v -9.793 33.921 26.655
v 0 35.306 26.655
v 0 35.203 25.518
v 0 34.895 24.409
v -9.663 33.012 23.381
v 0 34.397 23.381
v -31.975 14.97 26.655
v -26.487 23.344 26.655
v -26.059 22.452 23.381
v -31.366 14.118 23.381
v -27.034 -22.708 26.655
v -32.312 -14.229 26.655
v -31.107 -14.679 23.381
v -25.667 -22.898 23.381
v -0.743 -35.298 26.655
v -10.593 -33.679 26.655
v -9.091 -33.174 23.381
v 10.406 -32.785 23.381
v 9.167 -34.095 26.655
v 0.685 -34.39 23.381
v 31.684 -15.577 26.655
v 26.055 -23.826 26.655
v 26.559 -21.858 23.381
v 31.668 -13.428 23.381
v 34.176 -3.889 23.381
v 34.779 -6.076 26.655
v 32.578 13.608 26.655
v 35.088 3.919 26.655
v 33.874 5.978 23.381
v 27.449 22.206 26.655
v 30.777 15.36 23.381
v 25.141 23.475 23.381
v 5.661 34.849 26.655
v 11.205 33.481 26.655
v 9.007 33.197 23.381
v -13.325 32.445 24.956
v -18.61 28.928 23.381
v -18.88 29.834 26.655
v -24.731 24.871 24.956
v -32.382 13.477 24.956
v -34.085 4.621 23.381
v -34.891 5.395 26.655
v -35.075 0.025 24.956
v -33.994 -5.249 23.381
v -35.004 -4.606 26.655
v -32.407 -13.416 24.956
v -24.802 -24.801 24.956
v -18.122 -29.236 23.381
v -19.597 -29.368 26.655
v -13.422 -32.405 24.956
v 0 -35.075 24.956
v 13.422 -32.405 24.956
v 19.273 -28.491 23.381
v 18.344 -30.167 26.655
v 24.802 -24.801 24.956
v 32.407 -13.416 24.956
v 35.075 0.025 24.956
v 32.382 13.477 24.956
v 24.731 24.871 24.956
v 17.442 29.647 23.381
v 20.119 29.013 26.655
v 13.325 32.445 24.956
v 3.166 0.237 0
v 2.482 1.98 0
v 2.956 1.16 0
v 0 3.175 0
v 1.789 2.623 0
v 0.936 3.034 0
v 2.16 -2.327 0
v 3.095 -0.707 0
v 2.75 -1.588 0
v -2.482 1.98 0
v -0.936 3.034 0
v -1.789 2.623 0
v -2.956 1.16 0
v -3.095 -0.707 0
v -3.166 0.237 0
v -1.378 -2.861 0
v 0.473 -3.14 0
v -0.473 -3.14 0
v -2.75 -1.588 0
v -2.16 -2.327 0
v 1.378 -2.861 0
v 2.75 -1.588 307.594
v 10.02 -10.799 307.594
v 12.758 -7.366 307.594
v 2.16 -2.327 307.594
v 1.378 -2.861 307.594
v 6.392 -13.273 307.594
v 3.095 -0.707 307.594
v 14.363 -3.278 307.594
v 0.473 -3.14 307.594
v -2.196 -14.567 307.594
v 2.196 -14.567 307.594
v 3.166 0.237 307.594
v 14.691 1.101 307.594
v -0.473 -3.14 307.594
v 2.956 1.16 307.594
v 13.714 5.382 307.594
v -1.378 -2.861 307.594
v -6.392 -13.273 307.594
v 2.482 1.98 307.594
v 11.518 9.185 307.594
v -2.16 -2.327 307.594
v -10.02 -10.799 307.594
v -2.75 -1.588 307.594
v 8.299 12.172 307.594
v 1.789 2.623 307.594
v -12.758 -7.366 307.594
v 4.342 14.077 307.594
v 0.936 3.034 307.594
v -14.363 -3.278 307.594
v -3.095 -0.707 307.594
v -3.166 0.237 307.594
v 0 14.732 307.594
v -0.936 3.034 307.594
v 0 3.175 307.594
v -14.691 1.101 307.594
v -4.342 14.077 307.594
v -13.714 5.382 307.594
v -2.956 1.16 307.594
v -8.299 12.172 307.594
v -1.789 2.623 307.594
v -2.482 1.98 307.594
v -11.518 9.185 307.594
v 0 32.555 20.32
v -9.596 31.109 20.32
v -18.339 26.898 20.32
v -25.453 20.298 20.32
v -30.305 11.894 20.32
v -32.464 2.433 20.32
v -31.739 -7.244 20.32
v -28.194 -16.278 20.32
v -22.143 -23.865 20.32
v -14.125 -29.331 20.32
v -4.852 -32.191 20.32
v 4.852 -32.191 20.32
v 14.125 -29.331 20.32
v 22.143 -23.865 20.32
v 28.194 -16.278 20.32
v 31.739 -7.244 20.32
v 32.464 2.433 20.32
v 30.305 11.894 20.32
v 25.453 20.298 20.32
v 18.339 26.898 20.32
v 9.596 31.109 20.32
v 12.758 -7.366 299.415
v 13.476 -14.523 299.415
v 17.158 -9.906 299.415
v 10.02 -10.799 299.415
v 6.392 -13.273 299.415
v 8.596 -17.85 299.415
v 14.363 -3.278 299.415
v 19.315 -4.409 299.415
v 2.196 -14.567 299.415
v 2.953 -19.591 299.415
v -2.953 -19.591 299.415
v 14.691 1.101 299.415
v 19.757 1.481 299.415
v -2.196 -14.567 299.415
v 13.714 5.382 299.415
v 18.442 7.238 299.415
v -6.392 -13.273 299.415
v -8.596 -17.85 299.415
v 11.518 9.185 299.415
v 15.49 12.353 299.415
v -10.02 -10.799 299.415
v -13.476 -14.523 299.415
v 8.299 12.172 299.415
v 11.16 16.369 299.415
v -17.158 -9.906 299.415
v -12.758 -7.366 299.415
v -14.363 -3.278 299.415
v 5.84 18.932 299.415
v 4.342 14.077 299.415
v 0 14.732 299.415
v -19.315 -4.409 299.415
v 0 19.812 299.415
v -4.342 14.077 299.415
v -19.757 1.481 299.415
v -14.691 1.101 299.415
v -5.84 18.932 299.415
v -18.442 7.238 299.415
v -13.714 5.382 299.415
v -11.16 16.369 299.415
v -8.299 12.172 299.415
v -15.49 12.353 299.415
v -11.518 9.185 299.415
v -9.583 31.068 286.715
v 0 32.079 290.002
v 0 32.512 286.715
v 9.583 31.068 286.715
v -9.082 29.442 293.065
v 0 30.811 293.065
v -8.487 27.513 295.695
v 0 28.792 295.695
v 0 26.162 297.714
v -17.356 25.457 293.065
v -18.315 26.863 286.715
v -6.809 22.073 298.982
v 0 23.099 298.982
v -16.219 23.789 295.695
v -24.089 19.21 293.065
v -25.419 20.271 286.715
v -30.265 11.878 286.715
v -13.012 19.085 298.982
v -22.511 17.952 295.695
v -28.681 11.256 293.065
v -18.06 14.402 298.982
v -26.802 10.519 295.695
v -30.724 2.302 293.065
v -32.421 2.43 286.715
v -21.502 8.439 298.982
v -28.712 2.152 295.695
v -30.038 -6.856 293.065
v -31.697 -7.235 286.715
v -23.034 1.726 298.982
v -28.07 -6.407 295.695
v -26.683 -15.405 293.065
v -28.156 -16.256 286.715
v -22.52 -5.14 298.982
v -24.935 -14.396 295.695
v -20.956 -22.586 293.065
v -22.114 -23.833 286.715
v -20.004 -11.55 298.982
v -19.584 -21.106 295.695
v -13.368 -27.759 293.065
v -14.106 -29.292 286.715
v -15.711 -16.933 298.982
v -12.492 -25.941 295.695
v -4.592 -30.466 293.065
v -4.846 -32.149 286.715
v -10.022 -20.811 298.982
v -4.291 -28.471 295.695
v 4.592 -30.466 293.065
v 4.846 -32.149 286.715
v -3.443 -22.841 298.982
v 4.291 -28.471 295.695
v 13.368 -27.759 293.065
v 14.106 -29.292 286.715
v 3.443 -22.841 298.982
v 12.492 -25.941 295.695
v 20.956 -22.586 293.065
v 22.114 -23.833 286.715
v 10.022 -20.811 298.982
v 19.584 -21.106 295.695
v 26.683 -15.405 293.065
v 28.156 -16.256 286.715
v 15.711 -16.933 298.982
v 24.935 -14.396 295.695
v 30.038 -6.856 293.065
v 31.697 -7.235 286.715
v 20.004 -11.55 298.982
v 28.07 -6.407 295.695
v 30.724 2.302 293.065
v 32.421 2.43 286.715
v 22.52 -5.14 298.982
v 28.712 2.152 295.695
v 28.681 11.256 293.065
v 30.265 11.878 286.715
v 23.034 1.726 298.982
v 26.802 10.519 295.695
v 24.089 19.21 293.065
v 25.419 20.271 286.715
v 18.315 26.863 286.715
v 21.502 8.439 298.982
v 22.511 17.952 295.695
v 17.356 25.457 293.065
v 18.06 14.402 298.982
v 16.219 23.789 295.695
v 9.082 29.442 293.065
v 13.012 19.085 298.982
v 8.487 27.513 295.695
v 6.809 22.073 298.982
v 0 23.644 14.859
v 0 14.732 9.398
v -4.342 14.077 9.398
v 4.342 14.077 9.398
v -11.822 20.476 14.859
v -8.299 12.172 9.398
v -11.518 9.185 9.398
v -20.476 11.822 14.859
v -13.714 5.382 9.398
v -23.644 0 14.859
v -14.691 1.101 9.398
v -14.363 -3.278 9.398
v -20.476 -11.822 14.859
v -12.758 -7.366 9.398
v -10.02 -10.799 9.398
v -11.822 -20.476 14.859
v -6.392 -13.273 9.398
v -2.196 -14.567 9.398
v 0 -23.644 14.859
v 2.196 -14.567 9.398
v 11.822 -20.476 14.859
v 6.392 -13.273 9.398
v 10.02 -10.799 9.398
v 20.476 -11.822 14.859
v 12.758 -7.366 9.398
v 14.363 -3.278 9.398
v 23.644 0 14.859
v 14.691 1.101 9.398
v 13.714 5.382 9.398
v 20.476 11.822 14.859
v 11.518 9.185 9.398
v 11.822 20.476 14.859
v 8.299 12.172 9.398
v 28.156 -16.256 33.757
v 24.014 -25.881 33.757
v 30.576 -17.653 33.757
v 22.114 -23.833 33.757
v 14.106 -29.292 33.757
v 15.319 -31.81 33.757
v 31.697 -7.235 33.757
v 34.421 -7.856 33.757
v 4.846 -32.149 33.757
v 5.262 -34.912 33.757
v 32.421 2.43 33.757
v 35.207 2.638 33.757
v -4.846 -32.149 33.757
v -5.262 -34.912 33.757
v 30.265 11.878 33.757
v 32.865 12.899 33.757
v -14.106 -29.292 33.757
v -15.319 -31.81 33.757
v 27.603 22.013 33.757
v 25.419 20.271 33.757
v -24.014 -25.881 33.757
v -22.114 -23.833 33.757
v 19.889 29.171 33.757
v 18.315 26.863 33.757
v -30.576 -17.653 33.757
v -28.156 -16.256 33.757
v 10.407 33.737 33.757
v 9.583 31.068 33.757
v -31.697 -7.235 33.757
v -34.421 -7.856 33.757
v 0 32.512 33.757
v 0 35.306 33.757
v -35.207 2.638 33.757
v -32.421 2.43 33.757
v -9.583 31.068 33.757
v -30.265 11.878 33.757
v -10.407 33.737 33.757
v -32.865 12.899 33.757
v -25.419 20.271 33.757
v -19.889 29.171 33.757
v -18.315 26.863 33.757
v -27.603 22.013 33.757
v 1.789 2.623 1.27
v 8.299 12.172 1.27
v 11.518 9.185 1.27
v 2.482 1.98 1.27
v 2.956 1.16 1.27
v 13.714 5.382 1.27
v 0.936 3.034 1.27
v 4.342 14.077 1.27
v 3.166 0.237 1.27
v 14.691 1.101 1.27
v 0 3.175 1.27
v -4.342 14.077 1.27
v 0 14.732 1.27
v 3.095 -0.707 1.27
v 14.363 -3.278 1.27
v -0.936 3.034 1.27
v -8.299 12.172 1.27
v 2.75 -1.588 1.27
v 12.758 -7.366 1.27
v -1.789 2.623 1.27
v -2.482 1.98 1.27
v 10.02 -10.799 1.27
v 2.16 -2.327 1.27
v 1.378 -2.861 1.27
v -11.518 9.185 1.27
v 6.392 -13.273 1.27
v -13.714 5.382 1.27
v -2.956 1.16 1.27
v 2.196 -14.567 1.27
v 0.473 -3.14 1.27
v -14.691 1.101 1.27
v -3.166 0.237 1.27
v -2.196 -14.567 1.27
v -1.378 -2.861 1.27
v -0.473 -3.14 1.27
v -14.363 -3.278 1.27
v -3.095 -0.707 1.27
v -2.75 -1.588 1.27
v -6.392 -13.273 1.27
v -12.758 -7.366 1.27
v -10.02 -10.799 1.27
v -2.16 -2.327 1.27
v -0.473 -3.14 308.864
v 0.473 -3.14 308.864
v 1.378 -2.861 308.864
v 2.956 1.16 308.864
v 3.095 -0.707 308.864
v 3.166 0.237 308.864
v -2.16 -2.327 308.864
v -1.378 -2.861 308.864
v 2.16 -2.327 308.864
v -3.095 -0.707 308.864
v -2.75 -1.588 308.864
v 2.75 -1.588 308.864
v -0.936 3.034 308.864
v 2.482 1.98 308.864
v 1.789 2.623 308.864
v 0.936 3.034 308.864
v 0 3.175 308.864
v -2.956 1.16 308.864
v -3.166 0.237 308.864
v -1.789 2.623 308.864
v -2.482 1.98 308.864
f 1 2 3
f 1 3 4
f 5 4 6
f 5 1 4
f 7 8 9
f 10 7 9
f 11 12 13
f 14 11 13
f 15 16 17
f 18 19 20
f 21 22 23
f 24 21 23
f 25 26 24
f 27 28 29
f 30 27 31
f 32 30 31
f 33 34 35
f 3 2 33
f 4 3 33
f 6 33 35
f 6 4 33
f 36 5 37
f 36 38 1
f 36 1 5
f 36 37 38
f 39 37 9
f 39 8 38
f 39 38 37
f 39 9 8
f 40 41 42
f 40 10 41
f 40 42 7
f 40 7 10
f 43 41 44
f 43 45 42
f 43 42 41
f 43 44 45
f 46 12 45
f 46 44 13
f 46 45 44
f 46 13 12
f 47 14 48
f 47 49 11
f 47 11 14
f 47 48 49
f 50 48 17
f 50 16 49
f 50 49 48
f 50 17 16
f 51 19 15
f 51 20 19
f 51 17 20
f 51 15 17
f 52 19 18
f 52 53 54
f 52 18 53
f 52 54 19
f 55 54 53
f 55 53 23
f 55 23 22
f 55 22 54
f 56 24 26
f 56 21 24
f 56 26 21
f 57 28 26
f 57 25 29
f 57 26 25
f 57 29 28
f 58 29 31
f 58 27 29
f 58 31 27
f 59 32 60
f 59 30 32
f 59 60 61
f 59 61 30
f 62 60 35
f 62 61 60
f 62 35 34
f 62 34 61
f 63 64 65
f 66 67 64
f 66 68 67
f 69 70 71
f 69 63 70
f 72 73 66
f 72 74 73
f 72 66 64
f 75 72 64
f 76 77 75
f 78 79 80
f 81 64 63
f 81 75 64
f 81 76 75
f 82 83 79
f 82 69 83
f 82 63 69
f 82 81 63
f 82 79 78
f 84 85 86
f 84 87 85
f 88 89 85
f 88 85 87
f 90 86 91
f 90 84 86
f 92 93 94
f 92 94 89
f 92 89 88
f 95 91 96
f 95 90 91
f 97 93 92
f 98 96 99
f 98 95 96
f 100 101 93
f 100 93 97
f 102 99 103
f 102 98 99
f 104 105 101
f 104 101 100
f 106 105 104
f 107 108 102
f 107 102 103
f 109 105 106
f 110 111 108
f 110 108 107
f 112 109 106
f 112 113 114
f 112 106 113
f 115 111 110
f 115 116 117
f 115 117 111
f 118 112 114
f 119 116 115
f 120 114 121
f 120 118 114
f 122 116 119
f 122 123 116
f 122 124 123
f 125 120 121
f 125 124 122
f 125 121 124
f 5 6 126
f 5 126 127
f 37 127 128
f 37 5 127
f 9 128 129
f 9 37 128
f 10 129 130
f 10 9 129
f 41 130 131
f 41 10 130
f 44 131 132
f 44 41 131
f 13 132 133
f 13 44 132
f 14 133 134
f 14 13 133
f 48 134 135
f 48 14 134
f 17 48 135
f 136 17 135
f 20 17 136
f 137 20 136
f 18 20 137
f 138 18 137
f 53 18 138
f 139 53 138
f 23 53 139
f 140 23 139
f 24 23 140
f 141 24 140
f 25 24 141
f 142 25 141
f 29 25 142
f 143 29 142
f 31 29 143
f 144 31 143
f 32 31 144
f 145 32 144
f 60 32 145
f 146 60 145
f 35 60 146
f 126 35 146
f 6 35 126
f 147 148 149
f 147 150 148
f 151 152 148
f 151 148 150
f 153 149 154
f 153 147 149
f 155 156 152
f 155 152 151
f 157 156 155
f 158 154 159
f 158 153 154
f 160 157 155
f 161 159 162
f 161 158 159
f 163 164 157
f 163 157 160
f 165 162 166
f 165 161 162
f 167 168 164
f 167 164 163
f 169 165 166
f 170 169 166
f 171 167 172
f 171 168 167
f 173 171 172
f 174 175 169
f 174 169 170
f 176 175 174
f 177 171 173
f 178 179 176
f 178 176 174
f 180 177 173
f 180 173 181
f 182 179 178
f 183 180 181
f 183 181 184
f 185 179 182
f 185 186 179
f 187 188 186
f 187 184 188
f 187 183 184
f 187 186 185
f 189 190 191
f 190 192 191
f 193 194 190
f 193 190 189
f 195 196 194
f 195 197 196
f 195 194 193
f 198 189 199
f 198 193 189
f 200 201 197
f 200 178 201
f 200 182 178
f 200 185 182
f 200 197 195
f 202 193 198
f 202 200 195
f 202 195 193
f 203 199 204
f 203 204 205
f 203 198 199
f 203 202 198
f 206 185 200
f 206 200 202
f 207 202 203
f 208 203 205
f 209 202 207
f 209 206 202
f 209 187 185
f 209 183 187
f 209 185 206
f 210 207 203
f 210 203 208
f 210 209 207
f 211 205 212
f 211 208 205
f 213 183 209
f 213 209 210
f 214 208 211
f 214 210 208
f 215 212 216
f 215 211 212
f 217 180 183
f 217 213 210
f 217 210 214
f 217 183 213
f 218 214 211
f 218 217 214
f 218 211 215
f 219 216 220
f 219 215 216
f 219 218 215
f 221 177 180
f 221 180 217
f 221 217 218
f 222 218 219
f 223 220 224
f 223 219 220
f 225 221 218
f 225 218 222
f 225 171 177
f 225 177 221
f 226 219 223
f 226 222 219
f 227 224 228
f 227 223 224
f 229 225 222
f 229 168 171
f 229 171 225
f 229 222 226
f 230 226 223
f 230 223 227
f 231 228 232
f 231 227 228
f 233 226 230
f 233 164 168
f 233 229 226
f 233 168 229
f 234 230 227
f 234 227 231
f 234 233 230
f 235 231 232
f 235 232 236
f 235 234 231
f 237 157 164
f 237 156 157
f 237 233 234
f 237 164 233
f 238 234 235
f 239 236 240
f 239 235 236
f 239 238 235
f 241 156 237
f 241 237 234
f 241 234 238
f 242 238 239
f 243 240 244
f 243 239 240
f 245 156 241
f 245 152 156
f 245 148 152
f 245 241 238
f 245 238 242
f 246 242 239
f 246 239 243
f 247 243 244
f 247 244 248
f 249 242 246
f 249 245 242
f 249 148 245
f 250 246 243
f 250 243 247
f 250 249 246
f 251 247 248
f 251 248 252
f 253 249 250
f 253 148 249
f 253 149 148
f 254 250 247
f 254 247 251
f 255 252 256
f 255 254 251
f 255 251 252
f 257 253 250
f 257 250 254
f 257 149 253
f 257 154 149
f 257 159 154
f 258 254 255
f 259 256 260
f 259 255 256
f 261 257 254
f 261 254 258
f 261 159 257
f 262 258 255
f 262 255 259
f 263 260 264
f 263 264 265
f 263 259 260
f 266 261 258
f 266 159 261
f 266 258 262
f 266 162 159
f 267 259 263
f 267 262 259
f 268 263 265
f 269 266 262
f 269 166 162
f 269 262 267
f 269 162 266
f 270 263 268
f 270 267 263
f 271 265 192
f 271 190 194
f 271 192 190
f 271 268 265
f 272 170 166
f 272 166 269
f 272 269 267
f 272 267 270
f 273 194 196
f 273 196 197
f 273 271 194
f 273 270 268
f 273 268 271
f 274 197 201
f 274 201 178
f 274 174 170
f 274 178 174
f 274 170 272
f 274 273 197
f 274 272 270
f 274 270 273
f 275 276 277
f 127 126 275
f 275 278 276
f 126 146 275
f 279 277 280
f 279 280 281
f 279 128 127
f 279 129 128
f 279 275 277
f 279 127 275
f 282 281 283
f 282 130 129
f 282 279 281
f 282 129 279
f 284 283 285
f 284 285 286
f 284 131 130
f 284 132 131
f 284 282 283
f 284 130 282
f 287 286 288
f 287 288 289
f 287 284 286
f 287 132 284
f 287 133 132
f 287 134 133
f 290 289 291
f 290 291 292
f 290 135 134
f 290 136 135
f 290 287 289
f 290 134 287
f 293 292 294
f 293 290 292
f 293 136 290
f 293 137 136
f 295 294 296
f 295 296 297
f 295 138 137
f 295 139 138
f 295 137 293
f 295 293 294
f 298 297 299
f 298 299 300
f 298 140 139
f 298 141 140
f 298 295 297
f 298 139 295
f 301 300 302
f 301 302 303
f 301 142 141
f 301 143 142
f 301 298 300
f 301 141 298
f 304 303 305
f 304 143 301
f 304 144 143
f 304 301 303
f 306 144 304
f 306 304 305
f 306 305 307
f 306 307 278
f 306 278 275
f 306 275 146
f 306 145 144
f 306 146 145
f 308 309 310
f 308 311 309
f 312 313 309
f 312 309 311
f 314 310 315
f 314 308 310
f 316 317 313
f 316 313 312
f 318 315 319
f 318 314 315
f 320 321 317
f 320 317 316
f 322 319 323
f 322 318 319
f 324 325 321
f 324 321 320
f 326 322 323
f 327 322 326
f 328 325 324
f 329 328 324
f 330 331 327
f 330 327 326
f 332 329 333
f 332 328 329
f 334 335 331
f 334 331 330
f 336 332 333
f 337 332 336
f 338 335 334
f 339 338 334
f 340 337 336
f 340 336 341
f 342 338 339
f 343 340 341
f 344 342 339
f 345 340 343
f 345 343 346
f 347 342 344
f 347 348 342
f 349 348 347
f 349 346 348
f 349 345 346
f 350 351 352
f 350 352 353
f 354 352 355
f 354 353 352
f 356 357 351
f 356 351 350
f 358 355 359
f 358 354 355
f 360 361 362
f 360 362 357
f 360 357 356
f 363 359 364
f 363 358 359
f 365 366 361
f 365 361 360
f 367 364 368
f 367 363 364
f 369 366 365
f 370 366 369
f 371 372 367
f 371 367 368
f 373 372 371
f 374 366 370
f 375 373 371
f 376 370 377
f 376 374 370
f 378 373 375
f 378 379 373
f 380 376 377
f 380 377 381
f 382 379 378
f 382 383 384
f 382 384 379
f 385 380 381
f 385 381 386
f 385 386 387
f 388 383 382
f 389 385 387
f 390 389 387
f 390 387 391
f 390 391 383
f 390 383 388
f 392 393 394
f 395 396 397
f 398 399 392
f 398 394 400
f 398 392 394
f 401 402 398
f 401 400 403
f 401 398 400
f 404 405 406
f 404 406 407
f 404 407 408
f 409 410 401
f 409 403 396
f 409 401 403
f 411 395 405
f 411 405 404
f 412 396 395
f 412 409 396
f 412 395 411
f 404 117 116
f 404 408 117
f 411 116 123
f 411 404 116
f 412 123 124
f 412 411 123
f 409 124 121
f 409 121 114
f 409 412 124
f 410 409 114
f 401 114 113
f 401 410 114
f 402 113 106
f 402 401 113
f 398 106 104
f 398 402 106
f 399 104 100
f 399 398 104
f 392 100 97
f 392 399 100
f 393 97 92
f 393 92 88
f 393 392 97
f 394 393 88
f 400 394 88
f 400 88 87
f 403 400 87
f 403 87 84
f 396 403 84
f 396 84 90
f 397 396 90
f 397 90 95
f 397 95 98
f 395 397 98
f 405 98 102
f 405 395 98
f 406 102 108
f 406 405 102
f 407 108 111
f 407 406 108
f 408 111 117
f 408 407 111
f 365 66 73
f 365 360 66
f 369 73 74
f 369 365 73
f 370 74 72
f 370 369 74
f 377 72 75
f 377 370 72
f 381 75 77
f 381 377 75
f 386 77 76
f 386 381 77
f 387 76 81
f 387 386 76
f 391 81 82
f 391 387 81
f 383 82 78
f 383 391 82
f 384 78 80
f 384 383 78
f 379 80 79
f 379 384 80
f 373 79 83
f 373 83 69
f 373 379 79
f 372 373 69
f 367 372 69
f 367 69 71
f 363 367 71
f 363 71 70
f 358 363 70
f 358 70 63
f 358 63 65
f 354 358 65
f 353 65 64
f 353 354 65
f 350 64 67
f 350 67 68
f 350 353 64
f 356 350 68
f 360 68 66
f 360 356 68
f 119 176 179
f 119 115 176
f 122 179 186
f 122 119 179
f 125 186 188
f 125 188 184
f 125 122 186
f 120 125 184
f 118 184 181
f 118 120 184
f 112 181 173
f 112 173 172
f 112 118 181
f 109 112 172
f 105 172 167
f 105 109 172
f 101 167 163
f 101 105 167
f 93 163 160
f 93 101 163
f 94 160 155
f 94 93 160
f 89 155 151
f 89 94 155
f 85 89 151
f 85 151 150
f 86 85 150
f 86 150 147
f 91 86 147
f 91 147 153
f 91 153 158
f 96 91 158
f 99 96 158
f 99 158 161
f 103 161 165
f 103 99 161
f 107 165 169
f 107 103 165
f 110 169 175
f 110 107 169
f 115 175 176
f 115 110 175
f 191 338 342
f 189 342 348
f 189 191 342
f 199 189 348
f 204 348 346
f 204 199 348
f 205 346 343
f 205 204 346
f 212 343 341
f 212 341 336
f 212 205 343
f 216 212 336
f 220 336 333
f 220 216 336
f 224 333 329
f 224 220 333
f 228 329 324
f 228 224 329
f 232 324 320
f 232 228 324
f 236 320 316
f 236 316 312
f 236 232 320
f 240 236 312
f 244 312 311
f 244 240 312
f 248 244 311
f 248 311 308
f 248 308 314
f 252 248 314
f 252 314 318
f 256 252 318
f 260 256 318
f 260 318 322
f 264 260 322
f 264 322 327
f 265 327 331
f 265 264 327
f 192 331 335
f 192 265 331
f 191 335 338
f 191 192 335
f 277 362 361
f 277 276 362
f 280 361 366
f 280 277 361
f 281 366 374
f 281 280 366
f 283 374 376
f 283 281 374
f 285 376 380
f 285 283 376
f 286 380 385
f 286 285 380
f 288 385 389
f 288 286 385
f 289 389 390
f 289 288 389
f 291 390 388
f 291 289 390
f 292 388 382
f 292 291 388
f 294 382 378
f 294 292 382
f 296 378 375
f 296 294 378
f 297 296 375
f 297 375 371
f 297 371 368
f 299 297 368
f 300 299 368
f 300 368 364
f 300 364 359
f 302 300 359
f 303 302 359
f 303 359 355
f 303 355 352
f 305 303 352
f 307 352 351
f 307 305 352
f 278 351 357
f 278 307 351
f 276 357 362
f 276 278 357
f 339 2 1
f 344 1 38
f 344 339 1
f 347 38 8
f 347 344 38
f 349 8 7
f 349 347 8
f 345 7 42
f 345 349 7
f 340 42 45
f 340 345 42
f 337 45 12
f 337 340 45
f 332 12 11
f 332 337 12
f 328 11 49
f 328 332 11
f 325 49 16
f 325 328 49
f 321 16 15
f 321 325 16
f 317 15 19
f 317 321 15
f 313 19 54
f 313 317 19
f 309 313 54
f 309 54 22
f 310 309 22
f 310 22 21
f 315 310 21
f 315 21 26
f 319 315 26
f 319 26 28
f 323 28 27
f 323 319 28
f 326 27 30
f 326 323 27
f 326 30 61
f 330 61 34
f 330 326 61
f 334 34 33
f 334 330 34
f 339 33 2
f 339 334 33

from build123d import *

# Parameters (mm, degrees)
FILLET1_R = 12.7
FILLET2_R = 6.35


with BuildPart() as part:
    # Sketch1 → Revolve1 (revolve)
    with BuildSketch(Plane(origin=(0, 0, 0), x_dir=(0, 0, -1), z_dir=(1, 0, 0))):
        Polygon((0, 0), (0, 3.175), (-1.27, 3.175), (-1.27, 14.732), (-9.398, 14.732), (-20.32, 32.555084127), (-24.892, 35.306), (-33.7566, 35.306), (-33.7566, 32.512), (-299.4152, 32.512), (-299.4152, 14.732), (-307.594, 14.732), (-307.594, 3.175), (-308.864, 3.175), (-308.864, 0), align=None)
    revolve(axis=Axis((0, 0, 0), (0, 0, 1)))

    # Fillet1
    fillet1_edges = [part.edges().sort_by_distance(p)[0] for p in [
        (0, -32.512, 299.4152),
    ]]
    fillet(fillet1_edges, radius=FILLET1_R)

    # Fillet2
    fillet2_edges = [part.edges().sort_by_distance(p)[0] for p in [
        (0, -35.306, 24.892),
    ]]
    fillet(fillet2_edges, radius=FILLET2_R)


solid = part.part
